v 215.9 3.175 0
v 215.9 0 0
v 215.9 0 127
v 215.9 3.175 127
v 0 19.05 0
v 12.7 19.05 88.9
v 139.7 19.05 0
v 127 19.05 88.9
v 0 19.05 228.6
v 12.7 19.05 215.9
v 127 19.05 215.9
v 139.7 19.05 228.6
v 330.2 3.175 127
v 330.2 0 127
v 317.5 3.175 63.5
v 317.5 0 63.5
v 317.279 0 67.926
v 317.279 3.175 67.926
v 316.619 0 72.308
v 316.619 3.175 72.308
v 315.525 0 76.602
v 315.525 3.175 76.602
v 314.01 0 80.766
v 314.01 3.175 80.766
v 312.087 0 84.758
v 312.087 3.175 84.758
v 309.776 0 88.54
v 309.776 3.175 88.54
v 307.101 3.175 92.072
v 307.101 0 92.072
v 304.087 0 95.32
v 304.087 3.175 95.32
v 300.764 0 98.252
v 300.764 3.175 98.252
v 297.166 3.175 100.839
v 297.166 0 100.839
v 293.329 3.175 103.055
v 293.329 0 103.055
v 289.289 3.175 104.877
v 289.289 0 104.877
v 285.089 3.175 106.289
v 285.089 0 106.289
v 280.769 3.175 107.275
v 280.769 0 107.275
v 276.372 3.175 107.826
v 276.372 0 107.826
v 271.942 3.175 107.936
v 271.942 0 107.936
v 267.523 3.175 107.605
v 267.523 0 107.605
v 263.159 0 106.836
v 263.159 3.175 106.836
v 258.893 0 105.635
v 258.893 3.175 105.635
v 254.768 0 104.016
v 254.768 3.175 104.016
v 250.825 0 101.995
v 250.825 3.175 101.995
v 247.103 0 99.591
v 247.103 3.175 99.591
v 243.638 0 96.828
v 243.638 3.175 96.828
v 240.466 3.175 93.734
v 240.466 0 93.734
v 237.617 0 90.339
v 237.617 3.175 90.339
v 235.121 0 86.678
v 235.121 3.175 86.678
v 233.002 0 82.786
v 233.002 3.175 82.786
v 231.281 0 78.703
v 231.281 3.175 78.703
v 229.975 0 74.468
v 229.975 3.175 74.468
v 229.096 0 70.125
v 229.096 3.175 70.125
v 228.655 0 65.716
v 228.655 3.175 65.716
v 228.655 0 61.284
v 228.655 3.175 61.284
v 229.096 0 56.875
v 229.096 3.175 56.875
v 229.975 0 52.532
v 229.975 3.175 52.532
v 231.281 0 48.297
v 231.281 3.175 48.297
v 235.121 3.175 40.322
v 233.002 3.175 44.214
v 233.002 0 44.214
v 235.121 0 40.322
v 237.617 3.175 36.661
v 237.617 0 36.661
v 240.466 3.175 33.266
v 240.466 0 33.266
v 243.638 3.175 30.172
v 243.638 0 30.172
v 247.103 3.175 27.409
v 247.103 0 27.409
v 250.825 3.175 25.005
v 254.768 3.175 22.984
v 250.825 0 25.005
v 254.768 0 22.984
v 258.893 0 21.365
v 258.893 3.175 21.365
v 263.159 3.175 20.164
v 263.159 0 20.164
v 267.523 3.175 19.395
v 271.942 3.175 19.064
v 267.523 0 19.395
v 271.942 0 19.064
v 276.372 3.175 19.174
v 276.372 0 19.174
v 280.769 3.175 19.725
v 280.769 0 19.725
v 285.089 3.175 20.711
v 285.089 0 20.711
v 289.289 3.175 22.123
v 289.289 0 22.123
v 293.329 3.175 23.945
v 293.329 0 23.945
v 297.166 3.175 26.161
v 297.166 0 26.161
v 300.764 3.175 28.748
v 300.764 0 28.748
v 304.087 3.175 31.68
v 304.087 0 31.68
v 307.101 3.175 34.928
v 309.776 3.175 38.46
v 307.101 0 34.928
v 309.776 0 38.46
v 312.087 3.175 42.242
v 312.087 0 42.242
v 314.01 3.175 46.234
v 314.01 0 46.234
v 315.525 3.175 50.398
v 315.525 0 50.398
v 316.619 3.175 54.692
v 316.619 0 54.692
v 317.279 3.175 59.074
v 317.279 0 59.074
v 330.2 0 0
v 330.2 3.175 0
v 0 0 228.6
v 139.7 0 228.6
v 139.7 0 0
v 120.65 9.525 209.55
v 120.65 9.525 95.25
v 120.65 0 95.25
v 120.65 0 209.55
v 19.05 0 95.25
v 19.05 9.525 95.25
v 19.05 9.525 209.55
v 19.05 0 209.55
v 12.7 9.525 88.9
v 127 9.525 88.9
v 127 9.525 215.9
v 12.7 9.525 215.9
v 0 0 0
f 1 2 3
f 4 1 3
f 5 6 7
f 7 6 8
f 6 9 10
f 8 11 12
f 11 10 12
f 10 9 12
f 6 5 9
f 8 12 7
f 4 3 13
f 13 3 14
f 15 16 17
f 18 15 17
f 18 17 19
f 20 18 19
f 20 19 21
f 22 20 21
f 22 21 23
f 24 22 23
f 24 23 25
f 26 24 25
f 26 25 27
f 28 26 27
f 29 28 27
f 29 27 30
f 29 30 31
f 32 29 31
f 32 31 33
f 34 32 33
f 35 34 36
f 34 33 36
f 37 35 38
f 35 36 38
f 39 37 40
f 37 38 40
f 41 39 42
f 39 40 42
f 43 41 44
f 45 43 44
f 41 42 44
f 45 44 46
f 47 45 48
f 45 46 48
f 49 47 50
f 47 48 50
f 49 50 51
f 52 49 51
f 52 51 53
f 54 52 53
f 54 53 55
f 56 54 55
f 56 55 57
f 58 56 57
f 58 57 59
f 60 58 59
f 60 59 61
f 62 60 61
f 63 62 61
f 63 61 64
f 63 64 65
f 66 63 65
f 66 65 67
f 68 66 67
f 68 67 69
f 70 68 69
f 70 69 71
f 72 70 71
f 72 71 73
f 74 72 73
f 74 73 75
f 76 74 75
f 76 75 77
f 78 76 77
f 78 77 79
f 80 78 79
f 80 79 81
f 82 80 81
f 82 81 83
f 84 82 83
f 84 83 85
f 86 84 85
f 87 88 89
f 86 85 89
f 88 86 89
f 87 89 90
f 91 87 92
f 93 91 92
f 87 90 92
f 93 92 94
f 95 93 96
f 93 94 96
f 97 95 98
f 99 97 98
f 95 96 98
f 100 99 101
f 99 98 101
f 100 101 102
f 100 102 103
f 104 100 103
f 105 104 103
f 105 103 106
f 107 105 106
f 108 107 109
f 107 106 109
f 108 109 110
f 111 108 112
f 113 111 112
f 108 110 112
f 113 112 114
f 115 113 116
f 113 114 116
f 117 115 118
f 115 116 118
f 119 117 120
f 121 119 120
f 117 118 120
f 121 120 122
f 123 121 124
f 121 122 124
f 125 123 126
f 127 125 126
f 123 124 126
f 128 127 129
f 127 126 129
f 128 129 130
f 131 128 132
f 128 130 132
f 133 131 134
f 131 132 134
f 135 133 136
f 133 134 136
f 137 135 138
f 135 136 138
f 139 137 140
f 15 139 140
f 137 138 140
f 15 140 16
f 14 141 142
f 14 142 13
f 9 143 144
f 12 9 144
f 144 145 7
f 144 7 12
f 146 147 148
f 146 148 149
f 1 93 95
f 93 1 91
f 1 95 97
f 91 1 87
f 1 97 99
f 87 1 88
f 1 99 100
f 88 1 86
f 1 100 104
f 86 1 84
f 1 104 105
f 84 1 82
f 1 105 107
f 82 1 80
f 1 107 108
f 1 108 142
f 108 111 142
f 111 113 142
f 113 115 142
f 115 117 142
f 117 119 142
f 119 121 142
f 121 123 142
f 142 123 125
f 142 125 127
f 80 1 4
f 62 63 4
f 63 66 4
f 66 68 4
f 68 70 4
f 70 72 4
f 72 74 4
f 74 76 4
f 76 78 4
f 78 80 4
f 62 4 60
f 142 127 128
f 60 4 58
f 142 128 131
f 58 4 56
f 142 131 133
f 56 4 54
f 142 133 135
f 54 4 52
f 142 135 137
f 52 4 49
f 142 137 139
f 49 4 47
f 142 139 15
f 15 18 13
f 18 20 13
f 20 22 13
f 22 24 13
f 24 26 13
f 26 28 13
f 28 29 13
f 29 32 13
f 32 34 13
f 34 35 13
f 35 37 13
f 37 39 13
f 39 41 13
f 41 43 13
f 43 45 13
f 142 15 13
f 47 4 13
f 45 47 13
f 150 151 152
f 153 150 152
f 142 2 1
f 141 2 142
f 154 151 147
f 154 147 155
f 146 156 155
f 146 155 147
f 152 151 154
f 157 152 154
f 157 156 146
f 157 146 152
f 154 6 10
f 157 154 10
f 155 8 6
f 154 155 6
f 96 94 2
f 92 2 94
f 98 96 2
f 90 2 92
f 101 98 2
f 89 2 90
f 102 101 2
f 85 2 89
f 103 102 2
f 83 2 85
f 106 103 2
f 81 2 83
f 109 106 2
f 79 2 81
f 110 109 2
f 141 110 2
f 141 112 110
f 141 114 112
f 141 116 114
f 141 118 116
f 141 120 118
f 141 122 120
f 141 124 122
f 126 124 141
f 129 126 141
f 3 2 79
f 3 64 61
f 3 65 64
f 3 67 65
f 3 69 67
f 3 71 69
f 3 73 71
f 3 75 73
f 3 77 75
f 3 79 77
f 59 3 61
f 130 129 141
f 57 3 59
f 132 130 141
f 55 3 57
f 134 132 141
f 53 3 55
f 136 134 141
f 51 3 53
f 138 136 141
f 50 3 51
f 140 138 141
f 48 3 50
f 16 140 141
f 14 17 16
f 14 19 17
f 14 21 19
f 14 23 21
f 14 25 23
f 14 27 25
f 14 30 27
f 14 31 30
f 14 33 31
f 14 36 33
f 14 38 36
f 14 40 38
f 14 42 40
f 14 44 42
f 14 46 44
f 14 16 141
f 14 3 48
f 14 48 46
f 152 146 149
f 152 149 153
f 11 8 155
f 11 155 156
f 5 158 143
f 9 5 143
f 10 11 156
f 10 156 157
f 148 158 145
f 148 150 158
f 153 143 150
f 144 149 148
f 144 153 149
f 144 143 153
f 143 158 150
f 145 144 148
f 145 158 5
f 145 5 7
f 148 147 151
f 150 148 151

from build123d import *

# Parameters (mm, degrees)
F0_W       = 139.7
F0_H       = 228.6
F1_DEPTH   = 19.05
F2_W       = 101.6
F2_H       = 114.3
F1_FACE1_W = 139.7
F1_FACE1_H = 228.6
F3_DEPTH   = 19.05
F4_W       = 114.3
F4_H       = 127
F5_DEPTH   = 9.525
F6_W       = 114.3
F6_H       = 127
F7_DEPTH   = 3.175
F8_R       = 44.45
F9_DEPTH   = 25.4


with BuildPart() as f1:
    # F0 (on Front) → F1 (new body)
    with BuildSketch(Plane.XZ):
        with Locations((69.85, 114.3)):
            Rectangle(F0_W, F0_H)
    extrude(amount=-F1_DEPTH)

    # F2 (on face) + F1_face1 (on face) → F3 (cut)
    with BuildSketch(Plane(origin=(0, 19.05, 0), x_dir=(-1, 0, 0), z_dir=(0, 1, 0))):
        with Locations((-69.85, 152.4)):
            Rectangle(F2_W, F2_H)
    with BuildSketch(Plane(origin=(69.85, 0, 114.3), x_dir=(1, 0, 0), z_dir=(0, -1, 0))):
        Rectangle(F1_FACE1_W, F1_FACE1_H)
    extrude(amount=-F3_DEPTH, dir=(0, 1, 0), mode=Mode.SUBTRACT)

    # F4 (on face) → F5 (cut)
    with BuildSketch(Plane(origin=(0, 19.05, 0), x_dir=(-1, 0, 0), z_dir=(0, 1, 0))):
        with Locations((-69.85, 152.4)):
            Rectangle(F4_W, F4_H)
    extrude(amount=-F5_DEPTH, mode=Mode.SUBTRACT)


with BuildPart() as f7:
    # F6 (on Front) → F7 (new body)
    with BuildSketch(Plane.XZ):
        with Locations((273.05, 63.5)):
            Rectangle(F6_W, F6_H)
    extrude(amount=-F7_DEPTH)

    # F8 (on face) → F9 (cut)
    with BuildSketch(Plane.XZ):
        with Locations((273.05, 63.5)):
            Circle(F8_R)
    extrude(amount=-F9_DEPTH, mode=Mode.SUBTRACT)


solid = Compound([f1.part, f7.part])
